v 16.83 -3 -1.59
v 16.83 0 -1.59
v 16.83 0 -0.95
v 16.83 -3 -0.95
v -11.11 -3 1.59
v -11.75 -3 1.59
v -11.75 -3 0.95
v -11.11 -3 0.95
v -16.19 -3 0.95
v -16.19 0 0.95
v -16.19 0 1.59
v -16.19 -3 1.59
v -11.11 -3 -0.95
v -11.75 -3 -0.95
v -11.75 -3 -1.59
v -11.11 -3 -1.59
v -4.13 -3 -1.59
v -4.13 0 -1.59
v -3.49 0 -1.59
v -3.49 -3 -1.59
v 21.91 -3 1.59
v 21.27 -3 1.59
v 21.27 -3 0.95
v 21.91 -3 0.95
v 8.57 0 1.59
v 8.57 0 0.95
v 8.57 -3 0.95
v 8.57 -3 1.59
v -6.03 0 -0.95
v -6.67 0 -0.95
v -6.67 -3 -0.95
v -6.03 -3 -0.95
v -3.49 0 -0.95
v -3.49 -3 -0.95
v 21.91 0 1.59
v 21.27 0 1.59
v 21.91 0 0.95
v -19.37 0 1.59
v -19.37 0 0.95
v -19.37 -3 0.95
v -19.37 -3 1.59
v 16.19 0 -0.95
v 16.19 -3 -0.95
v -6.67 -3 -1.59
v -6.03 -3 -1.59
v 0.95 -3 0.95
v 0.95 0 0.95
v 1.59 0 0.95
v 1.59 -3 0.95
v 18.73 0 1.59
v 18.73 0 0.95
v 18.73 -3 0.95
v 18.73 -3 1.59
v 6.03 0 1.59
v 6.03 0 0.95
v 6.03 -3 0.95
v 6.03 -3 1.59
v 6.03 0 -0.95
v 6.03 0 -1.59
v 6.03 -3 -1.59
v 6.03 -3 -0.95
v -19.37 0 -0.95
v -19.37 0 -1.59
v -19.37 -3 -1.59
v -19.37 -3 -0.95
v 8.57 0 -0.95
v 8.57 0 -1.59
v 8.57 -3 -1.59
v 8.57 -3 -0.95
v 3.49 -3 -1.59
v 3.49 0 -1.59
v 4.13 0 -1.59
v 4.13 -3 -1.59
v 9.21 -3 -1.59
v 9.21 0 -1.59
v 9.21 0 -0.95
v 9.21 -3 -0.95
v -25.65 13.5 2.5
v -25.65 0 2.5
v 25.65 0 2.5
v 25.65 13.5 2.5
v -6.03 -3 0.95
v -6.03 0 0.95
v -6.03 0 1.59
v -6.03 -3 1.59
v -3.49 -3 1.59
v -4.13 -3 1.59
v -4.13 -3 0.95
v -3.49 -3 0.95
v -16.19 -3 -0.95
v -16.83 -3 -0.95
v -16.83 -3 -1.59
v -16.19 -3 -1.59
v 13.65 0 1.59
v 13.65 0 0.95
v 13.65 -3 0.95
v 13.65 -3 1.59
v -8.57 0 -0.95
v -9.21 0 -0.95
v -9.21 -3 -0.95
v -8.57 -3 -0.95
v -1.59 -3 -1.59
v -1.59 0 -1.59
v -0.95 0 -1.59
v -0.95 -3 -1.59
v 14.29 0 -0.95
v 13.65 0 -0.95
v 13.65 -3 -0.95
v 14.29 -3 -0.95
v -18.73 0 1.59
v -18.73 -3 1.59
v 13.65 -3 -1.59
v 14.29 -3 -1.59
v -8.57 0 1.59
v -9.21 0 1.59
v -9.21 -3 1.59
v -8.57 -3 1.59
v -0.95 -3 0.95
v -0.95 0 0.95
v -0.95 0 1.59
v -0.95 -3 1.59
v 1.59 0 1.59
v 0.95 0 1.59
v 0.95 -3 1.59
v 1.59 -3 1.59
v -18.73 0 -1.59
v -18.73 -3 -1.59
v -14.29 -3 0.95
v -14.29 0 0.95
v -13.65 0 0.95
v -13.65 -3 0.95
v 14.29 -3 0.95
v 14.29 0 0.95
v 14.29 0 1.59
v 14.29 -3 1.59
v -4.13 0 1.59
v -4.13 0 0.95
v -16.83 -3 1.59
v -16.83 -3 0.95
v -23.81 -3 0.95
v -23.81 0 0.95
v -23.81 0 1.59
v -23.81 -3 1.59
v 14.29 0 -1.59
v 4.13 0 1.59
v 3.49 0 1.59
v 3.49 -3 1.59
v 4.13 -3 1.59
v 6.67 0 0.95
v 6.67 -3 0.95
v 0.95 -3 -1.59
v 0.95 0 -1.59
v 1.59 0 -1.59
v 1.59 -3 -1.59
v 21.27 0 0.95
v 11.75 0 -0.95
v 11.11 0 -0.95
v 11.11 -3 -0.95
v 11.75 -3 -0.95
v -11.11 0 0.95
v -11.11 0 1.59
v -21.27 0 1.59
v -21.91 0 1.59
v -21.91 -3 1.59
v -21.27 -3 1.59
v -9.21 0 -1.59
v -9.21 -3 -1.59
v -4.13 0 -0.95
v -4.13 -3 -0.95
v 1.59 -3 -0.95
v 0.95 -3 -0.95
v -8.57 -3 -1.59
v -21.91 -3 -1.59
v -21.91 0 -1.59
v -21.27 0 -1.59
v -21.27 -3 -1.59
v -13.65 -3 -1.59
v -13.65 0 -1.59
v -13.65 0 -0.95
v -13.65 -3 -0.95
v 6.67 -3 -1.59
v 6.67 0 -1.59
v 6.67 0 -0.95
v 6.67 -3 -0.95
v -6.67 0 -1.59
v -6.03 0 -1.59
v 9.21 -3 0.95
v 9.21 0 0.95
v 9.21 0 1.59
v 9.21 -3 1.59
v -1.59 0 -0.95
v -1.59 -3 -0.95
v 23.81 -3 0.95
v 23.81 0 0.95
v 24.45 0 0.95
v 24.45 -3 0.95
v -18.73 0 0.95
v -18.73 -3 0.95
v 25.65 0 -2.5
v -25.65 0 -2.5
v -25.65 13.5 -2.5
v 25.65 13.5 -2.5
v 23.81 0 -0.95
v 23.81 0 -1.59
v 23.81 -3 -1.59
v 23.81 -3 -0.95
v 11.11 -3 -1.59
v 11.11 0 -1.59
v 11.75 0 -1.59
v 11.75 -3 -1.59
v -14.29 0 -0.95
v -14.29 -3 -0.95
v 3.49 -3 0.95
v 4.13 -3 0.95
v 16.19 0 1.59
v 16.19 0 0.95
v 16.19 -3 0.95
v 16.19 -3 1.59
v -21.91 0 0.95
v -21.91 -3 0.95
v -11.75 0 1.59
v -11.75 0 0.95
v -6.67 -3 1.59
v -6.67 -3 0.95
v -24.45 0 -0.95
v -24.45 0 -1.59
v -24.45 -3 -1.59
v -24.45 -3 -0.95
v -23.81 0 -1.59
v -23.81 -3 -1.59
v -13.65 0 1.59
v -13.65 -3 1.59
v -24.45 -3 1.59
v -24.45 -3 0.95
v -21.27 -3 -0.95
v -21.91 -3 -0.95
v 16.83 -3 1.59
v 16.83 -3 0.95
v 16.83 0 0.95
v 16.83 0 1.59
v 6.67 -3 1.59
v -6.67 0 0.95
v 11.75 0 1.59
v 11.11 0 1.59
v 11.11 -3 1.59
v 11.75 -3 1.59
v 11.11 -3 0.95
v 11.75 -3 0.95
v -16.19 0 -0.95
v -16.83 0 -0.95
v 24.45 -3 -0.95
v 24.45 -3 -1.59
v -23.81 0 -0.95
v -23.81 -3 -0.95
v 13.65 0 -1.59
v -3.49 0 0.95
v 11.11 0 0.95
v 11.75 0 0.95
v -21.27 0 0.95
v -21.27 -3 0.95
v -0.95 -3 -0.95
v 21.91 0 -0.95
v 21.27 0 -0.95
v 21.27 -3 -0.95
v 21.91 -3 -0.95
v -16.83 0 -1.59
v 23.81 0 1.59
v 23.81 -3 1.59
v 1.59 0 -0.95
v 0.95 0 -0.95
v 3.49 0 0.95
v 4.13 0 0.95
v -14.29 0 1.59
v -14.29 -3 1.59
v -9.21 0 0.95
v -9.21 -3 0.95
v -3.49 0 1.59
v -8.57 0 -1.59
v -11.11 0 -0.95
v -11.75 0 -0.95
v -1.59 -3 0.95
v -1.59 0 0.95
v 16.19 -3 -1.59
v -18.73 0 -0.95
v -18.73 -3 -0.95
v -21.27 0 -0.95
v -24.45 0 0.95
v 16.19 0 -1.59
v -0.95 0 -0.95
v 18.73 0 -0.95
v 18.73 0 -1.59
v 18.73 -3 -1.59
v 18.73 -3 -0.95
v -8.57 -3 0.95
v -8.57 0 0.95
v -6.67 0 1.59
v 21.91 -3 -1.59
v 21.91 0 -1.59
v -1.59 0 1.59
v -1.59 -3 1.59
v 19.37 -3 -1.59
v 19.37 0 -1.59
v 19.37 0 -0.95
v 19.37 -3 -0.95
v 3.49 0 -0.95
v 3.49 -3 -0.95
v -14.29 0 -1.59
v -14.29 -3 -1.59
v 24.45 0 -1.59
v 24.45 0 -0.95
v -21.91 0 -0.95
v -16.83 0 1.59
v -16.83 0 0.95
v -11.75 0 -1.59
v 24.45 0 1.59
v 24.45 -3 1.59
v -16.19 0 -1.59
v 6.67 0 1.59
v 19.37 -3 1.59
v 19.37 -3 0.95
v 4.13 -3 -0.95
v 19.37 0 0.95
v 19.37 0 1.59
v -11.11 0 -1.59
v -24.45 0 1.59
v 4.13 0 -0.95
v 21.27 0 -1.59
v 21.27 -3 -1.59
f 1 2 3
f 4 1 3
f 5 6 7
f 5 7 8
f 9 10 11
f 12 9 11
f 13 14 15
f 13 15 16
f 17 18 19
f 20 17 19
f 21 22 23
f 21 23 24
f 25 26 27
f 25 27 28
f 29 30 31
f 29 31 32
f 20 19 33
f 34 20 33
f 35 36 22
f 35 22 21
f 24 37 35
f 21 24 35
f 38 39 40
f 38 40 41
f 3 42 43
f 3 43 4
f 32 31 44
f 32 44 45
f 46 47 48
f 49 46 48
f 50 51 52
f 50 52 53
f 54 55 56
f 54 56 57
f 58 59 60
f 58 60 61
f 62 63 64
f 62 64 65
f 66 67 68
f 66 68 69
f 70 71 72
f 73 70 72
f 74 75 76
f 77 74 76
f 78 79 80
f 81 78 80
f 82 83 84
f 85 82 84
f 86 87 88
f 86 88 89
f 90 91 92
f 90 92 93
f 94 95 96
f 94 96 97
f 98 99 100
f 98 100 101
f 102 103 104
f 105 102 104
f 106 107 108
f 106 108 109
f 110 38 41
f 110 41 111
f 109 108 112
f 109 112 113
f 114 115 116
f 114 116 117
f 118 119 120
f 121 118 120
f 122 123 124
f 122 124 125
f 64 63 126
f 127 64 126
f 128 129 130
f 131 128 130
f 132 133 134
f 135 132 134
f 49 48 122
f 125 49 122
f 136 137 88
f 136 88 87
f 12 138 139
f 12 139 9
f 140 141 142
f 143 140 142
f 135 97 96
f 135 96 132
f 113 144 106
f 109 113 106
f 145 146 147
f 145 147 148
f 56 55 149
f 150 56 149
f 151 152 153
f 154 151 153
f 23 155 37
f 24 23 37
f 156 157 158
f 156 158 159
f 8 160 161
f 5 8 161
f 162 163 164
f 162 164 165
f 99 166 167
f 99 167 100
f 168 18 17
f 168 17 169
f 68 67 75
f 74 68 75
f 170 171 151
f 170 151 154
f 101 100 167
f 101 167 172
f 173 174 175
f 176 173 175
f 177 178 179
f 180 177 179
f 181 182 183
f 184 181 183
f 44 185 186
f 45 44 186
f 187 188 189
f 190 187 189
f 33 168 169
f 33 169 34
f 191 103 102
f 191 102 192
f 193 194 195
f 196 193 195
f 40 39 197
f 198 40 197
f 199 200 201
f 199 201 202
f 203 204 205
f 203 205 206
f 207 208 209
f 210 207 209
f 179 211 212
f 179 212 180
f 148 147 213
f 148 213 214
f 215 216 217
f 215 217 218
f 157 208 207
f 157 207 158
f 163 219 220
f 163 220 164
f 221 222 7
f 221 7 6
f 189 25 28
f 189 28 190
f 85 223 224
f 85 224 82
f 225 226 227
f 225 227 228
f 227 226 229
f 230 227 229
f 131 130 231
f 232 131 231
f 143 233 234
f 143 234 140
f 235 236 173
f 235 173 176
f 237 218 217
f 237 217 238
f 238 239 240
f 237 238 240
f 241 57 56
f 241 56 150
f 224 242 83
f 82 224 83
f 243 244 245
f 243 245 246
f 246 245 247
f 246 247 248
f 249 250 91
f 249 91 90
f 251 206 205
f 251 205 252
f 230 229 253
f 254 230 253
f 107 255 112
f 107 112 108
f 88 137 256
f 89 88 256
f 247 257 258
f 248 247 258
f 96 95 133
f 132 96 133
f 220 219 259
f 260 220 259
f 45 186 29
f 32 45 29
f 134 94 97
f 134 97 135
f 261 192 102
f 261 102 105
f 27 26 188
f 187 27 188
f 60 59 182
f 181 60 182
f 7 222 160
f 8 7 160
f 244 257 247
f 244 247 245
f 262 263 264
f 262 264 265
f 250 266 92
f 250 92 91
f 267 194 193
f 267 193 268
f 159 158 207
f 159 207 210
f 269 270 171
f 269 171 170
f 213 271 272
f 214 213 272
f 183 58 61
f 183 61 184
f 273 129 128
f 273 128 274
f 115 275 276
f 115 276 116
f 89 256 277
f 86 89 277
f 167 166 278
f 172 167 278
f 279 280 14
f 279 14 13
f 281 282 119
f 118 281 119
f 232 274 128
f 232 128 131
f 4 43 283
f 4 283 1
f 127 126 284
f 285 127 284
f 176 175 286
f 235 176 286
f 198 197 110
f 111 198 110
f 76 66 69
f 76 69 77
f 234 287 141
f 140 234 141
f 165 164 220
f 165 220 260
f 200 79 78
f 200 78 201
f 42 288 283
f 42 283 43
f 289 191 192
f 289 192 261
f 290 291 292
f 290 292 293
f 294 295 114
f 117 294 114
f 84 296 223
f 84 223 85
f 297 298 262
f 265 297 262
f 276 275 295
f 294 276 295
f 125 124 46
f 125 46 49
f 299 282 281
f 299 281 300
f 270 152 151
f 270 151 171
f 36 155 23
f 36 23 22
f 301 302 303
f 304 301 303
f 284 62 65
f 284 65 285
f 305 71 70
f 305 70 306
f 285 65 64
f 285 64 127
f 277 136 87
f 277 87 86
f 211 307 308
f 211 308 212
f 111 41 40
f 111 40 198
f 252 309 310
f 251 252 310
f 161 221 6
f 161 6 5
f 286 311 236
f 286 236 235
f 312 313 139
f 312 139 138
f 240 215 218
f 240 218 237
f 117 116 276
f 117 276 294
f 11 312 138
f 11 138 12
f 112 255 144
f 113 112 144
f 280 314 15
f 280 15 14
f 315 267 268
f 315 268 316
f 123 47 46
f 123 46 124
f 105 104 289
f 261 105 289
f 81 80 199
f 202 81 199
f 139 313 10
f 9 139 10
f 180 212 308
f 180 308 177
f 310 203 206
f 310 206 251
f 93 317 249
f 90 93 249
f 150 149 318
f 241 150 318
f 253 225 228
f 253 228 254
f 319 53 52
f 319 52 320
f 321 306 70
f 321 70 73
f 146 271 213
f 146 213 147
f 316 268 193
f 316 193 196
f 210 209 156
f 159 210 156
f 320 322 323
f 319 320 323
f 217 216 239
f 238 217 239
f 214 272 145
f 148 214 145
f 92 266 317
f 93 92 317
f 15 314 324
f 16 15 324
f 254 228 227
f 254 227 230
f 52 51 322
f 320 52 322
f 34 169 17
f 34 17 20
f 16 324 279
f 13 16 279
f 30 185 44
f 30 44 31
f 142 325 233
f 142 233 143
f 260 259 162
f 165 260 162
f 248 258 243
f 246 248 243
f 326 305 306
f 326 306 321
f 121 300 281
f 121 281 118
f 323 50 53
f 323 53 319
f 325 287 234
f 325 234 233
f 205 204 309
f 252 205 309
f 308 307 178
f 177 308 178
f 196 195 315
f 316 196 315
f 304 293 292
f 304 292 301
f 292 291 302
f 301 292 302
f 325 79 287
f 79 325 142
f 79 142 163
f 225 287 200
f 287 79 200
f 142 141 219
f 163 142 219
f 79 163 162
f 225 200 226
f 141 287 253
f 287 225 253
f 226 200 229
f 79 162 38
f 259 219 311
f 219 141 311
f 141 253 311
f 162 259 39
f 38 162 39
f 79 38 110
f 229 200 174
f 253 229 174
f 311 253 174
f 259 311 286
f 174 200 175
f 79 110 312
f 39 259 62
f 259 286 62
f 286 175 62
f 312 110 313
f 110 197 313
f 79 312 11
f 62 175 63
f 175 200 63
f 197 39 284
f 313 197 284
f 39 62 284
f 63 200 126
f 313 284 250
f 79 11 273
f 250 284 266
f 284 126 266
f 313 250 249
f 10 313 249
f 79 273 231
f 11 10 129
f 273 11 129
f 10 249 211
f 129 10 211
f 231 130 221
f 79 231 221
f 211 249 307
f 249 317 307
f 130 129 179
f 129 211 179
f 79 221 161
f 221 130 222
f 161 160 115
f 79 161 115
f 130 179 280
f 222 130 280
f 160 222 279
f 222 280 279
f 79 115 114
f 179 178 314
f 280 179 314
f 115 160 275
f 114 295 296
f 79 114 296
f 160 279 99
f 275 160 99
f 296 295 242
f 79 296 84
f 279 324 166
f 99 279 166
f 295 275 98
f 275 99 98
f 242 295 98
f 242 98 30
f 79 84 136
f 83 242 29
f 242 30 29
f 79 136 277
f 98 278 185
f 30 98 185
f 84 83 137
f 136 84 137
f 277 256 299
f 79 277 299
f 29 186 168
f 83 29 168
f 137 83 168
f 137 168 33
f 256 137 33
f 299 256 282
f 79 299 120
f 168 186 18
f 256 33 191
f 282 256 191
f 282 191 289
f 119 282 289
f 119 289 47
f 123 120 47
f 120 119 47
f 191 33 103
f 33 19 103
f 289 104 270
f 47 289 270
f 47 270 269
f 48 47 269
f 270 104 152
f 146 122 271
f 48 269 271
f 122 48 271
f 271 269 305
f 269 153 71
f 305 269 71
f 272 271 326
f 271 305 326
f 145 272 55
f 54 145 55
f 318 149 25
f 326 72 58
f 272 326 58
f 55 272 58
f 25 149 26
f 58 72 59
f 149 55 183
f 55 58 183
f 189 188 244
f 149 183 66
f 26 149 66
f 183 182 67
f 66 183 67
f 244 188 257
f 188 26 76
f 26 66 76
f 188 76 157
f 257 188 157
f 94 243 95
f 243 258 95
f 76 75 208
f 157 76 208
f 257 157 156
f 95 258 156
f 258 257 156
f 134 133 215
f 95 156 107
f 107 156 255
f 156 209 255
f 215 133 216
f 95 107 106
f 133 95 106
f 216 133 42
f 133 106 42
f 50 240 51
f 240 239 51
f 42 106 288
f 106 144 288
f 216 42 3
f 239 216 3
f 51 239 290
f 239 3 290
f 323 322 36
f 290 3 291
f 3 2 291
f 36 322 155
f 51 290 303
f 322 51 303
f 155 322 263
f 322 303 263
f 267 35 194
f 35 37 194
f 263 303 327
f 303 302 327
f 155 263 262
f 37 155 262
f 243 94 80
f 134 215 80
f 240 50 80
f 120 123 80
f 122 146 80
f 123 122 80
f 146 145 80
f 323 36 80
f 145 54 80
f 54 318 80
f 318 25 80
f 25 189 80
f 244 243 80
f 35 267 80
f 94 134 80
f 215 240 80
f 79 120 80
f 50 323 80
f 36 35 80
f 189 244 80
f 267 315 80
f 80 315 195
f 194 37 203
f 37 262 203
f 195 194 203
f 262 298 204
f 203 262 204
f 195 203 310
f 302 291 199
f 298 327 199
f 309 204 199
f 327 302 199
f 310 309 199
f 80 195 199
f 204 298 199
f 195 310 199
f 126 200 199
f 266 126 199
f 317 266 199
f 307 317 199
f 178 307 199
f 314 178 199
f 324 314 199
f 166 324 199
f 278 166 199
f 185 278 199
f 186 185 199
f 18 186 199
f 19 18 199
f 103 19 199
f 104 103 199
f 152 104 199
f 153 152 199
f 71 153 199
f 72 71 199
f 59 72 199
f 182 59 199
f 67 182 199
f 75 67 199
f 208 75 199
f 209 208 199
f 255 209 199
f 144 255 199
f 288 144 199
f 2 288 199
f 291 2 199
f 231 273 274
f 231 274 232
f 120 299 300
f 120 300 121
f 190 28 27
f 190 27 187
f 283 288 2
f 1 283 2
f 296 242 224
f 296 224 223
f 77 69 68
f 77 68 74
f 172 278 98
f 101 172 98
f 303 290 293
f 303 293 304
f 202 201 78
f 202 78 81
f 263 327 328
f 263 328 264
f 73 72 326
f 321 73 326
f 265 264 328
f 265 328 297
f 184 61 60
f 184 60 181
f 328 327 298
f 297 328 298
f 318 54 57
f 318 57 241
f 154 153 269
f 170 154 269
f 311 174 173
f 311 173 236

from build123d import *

# Parameters (mm, degrees)
SKETCH1_W           = 51.3
SKETCH1_H           = 5
BOSS_EXTRUDE1_DEPTH = 13.5
SKETCH2_W           = 0.64
SKETCH2_H           = 0.64
BOSS_EXTRUDE2_DEPTH = 3


with BuildPart() as part:
    # Sketch1 → Boss-Extrude1 (new body)
    with BuildSketch(Plane(origin=(0, 0, 0), x_dir=(1, 0, 0), z_dir=(0, 1, 0))):
        Rectangle(SKETCH1_W, SKETCH1_H)
    extrude(amount=BOSS_EXTRUDE1_DEPTH)

    # Sketch2 → Boss-Extrude2 (add)
    with BuildSketch(Plane.XZ):
        with Locations((-21.59, 1.27)):
            Rectangle(SKETCH2_W, SKETCH2_H)
        with Locations((-24.13, 1.27)):
            Rectangle(SKETCH2_W, SKETCH2_H)
        with Locations((-19.05, 1.27)):
            Rectangle(SKETCH2_W, SKETCH2_H)
        with Locations((-16.51, 1.27)):
            Rectangle(SKETCH2_W, SKETCH2_H)
        with Locations((-13.97, 1.27)):
            Rectangle(SKETCH2_W, SKETCH2_H)
        with Locations((-11.43, 1.27)):
            Rectangle(SKETCH2_W, SKETCH2_H)
        with Locations((-8.89, 1.27)):
            Rectangle(SKETCH2_W, SKETCH2_H)
        with Locations((-6.35, 1.27)):
            Rectangle(SKETCH2_W, SKETCH2_H)
        with Locations((-3.81, 1.27)):
            Rectangle(SKETCH2_W, SKETCH2_H)
        with Locations((-1.27, 1.27)):
            Rectangle(SKETCH2_W, SKETCH2_H)
        with Locations((24.13, 1.27)):
            Rectangle(SKETCH2_W, SKETCH2_H)
        with Locations((1.27, 1.27)):
            Rectangle(SKETCH2_W, SKETCH2_H)
        with Locations((3.81, 1.27)):
            Rectangle(SKETCH2_W, SKETCH2_H)
        with Locations((6.35, 1.27)):
            Rectangle(SKETCH2_W, SKETCH2_H)
        with Locations((8.89, 1.27)):
            Rectangle(SKETCH2_W, SKETCH2_H)
        with Locations((11.43, 1.27)):
            Rectangle(SKETCH2_W, SKETCH2_H)
        with Locations((13.97, 1.27)):
            Rectangle(SKETCH2_W, SKETCH2_H)
        with Locations((16.51, 1.27)):
            Rectangle(SKETCH2_W, SKETCH2_H)
        with Locations((19.05, 1.27)):
            Rectangle(SKETCH2_W, SKETCH2_H)
        with Locations((21.59, 1.27)):
            Rectangle(SKETCH2_W, SKETCH2_H)
        with Locations((21.59, -1.27)):
            Rectangle(SKETCH2_W, SKETCH2_H)
        with Locations((19.05, -1.27)):
            Rectangle(SKETCH2_W, SKETCH2_H)
        with Locations((16.51, -1.27)):
            Rectangle(SKETCH2_W, SKETCH2_H)
        with Locations((13.97, -1.27)):
            Rectangle(SKETCH2_W, SKETCH2_H)
        with Locations((11.43, -1.27)):
            Rectangle(SKETCH2_W, SKETCH2_H)
        with Locations((8.89, -1.27)):
            Rectangle(SKETCH2_W, SKETCH2_H)
        with Locations((6.35, -1.27)):
            Rectangle(SKETCH2_W, SKETCH2_H)
        with Locations((3.81, -1.27)):
            Rectangle(SKETCH2_W, SKETCH2_H)
        with Locations((1.27, -1.27)):
            Rectangle(SKETCH2_W, SKETCH2_H)
        with Locations((24.13, -1.27)):
            Rectangle(SKETCH2_W, SKETCH2_H)
        with Locations((-1.27, -1.27)):
            Rectangle(SKETCH2_W, SKETCH2_H)
        with Locations((-3.81, -1.27)):
            Rectangle(SKETCH2_W, SKETCH2_H)
        with Locations((-6.35, -1.27)):
            Rectangle(SKETCH2_W, SKETCH2_H)
        with Locations((-8.89, -1.27)):
            Rectangle(SKETCH2_W, SKETCH2_H)
        with Locations((-11.43, -1.27)):
            Rectangle(SKETCH2_W, SKETCH2_H)
        with Locations((-13.97, -1.27)):
            Rectangle(SKETCH2_W, SKETCH2_H)
        with Locations((-16.51, -1.27)):
            Rectangle(SKETCH2_W, SKETCH2_H)
        with Locations((-19.05, -1.27)):
            Rectangle(SKETCH2_W, SKETCH2_H)
        with Locations((-21.59, -1.27)):
            Rectangle(SKETCH2_W, SKETCH2_H)
        with Locations((-24.13, -1.27)):
            Rectangle(SKETCH2_W, SKETCH2_H)
    extrude(amount=BOSS_EXTRUDE2_DEPTH)


solid = part.part
